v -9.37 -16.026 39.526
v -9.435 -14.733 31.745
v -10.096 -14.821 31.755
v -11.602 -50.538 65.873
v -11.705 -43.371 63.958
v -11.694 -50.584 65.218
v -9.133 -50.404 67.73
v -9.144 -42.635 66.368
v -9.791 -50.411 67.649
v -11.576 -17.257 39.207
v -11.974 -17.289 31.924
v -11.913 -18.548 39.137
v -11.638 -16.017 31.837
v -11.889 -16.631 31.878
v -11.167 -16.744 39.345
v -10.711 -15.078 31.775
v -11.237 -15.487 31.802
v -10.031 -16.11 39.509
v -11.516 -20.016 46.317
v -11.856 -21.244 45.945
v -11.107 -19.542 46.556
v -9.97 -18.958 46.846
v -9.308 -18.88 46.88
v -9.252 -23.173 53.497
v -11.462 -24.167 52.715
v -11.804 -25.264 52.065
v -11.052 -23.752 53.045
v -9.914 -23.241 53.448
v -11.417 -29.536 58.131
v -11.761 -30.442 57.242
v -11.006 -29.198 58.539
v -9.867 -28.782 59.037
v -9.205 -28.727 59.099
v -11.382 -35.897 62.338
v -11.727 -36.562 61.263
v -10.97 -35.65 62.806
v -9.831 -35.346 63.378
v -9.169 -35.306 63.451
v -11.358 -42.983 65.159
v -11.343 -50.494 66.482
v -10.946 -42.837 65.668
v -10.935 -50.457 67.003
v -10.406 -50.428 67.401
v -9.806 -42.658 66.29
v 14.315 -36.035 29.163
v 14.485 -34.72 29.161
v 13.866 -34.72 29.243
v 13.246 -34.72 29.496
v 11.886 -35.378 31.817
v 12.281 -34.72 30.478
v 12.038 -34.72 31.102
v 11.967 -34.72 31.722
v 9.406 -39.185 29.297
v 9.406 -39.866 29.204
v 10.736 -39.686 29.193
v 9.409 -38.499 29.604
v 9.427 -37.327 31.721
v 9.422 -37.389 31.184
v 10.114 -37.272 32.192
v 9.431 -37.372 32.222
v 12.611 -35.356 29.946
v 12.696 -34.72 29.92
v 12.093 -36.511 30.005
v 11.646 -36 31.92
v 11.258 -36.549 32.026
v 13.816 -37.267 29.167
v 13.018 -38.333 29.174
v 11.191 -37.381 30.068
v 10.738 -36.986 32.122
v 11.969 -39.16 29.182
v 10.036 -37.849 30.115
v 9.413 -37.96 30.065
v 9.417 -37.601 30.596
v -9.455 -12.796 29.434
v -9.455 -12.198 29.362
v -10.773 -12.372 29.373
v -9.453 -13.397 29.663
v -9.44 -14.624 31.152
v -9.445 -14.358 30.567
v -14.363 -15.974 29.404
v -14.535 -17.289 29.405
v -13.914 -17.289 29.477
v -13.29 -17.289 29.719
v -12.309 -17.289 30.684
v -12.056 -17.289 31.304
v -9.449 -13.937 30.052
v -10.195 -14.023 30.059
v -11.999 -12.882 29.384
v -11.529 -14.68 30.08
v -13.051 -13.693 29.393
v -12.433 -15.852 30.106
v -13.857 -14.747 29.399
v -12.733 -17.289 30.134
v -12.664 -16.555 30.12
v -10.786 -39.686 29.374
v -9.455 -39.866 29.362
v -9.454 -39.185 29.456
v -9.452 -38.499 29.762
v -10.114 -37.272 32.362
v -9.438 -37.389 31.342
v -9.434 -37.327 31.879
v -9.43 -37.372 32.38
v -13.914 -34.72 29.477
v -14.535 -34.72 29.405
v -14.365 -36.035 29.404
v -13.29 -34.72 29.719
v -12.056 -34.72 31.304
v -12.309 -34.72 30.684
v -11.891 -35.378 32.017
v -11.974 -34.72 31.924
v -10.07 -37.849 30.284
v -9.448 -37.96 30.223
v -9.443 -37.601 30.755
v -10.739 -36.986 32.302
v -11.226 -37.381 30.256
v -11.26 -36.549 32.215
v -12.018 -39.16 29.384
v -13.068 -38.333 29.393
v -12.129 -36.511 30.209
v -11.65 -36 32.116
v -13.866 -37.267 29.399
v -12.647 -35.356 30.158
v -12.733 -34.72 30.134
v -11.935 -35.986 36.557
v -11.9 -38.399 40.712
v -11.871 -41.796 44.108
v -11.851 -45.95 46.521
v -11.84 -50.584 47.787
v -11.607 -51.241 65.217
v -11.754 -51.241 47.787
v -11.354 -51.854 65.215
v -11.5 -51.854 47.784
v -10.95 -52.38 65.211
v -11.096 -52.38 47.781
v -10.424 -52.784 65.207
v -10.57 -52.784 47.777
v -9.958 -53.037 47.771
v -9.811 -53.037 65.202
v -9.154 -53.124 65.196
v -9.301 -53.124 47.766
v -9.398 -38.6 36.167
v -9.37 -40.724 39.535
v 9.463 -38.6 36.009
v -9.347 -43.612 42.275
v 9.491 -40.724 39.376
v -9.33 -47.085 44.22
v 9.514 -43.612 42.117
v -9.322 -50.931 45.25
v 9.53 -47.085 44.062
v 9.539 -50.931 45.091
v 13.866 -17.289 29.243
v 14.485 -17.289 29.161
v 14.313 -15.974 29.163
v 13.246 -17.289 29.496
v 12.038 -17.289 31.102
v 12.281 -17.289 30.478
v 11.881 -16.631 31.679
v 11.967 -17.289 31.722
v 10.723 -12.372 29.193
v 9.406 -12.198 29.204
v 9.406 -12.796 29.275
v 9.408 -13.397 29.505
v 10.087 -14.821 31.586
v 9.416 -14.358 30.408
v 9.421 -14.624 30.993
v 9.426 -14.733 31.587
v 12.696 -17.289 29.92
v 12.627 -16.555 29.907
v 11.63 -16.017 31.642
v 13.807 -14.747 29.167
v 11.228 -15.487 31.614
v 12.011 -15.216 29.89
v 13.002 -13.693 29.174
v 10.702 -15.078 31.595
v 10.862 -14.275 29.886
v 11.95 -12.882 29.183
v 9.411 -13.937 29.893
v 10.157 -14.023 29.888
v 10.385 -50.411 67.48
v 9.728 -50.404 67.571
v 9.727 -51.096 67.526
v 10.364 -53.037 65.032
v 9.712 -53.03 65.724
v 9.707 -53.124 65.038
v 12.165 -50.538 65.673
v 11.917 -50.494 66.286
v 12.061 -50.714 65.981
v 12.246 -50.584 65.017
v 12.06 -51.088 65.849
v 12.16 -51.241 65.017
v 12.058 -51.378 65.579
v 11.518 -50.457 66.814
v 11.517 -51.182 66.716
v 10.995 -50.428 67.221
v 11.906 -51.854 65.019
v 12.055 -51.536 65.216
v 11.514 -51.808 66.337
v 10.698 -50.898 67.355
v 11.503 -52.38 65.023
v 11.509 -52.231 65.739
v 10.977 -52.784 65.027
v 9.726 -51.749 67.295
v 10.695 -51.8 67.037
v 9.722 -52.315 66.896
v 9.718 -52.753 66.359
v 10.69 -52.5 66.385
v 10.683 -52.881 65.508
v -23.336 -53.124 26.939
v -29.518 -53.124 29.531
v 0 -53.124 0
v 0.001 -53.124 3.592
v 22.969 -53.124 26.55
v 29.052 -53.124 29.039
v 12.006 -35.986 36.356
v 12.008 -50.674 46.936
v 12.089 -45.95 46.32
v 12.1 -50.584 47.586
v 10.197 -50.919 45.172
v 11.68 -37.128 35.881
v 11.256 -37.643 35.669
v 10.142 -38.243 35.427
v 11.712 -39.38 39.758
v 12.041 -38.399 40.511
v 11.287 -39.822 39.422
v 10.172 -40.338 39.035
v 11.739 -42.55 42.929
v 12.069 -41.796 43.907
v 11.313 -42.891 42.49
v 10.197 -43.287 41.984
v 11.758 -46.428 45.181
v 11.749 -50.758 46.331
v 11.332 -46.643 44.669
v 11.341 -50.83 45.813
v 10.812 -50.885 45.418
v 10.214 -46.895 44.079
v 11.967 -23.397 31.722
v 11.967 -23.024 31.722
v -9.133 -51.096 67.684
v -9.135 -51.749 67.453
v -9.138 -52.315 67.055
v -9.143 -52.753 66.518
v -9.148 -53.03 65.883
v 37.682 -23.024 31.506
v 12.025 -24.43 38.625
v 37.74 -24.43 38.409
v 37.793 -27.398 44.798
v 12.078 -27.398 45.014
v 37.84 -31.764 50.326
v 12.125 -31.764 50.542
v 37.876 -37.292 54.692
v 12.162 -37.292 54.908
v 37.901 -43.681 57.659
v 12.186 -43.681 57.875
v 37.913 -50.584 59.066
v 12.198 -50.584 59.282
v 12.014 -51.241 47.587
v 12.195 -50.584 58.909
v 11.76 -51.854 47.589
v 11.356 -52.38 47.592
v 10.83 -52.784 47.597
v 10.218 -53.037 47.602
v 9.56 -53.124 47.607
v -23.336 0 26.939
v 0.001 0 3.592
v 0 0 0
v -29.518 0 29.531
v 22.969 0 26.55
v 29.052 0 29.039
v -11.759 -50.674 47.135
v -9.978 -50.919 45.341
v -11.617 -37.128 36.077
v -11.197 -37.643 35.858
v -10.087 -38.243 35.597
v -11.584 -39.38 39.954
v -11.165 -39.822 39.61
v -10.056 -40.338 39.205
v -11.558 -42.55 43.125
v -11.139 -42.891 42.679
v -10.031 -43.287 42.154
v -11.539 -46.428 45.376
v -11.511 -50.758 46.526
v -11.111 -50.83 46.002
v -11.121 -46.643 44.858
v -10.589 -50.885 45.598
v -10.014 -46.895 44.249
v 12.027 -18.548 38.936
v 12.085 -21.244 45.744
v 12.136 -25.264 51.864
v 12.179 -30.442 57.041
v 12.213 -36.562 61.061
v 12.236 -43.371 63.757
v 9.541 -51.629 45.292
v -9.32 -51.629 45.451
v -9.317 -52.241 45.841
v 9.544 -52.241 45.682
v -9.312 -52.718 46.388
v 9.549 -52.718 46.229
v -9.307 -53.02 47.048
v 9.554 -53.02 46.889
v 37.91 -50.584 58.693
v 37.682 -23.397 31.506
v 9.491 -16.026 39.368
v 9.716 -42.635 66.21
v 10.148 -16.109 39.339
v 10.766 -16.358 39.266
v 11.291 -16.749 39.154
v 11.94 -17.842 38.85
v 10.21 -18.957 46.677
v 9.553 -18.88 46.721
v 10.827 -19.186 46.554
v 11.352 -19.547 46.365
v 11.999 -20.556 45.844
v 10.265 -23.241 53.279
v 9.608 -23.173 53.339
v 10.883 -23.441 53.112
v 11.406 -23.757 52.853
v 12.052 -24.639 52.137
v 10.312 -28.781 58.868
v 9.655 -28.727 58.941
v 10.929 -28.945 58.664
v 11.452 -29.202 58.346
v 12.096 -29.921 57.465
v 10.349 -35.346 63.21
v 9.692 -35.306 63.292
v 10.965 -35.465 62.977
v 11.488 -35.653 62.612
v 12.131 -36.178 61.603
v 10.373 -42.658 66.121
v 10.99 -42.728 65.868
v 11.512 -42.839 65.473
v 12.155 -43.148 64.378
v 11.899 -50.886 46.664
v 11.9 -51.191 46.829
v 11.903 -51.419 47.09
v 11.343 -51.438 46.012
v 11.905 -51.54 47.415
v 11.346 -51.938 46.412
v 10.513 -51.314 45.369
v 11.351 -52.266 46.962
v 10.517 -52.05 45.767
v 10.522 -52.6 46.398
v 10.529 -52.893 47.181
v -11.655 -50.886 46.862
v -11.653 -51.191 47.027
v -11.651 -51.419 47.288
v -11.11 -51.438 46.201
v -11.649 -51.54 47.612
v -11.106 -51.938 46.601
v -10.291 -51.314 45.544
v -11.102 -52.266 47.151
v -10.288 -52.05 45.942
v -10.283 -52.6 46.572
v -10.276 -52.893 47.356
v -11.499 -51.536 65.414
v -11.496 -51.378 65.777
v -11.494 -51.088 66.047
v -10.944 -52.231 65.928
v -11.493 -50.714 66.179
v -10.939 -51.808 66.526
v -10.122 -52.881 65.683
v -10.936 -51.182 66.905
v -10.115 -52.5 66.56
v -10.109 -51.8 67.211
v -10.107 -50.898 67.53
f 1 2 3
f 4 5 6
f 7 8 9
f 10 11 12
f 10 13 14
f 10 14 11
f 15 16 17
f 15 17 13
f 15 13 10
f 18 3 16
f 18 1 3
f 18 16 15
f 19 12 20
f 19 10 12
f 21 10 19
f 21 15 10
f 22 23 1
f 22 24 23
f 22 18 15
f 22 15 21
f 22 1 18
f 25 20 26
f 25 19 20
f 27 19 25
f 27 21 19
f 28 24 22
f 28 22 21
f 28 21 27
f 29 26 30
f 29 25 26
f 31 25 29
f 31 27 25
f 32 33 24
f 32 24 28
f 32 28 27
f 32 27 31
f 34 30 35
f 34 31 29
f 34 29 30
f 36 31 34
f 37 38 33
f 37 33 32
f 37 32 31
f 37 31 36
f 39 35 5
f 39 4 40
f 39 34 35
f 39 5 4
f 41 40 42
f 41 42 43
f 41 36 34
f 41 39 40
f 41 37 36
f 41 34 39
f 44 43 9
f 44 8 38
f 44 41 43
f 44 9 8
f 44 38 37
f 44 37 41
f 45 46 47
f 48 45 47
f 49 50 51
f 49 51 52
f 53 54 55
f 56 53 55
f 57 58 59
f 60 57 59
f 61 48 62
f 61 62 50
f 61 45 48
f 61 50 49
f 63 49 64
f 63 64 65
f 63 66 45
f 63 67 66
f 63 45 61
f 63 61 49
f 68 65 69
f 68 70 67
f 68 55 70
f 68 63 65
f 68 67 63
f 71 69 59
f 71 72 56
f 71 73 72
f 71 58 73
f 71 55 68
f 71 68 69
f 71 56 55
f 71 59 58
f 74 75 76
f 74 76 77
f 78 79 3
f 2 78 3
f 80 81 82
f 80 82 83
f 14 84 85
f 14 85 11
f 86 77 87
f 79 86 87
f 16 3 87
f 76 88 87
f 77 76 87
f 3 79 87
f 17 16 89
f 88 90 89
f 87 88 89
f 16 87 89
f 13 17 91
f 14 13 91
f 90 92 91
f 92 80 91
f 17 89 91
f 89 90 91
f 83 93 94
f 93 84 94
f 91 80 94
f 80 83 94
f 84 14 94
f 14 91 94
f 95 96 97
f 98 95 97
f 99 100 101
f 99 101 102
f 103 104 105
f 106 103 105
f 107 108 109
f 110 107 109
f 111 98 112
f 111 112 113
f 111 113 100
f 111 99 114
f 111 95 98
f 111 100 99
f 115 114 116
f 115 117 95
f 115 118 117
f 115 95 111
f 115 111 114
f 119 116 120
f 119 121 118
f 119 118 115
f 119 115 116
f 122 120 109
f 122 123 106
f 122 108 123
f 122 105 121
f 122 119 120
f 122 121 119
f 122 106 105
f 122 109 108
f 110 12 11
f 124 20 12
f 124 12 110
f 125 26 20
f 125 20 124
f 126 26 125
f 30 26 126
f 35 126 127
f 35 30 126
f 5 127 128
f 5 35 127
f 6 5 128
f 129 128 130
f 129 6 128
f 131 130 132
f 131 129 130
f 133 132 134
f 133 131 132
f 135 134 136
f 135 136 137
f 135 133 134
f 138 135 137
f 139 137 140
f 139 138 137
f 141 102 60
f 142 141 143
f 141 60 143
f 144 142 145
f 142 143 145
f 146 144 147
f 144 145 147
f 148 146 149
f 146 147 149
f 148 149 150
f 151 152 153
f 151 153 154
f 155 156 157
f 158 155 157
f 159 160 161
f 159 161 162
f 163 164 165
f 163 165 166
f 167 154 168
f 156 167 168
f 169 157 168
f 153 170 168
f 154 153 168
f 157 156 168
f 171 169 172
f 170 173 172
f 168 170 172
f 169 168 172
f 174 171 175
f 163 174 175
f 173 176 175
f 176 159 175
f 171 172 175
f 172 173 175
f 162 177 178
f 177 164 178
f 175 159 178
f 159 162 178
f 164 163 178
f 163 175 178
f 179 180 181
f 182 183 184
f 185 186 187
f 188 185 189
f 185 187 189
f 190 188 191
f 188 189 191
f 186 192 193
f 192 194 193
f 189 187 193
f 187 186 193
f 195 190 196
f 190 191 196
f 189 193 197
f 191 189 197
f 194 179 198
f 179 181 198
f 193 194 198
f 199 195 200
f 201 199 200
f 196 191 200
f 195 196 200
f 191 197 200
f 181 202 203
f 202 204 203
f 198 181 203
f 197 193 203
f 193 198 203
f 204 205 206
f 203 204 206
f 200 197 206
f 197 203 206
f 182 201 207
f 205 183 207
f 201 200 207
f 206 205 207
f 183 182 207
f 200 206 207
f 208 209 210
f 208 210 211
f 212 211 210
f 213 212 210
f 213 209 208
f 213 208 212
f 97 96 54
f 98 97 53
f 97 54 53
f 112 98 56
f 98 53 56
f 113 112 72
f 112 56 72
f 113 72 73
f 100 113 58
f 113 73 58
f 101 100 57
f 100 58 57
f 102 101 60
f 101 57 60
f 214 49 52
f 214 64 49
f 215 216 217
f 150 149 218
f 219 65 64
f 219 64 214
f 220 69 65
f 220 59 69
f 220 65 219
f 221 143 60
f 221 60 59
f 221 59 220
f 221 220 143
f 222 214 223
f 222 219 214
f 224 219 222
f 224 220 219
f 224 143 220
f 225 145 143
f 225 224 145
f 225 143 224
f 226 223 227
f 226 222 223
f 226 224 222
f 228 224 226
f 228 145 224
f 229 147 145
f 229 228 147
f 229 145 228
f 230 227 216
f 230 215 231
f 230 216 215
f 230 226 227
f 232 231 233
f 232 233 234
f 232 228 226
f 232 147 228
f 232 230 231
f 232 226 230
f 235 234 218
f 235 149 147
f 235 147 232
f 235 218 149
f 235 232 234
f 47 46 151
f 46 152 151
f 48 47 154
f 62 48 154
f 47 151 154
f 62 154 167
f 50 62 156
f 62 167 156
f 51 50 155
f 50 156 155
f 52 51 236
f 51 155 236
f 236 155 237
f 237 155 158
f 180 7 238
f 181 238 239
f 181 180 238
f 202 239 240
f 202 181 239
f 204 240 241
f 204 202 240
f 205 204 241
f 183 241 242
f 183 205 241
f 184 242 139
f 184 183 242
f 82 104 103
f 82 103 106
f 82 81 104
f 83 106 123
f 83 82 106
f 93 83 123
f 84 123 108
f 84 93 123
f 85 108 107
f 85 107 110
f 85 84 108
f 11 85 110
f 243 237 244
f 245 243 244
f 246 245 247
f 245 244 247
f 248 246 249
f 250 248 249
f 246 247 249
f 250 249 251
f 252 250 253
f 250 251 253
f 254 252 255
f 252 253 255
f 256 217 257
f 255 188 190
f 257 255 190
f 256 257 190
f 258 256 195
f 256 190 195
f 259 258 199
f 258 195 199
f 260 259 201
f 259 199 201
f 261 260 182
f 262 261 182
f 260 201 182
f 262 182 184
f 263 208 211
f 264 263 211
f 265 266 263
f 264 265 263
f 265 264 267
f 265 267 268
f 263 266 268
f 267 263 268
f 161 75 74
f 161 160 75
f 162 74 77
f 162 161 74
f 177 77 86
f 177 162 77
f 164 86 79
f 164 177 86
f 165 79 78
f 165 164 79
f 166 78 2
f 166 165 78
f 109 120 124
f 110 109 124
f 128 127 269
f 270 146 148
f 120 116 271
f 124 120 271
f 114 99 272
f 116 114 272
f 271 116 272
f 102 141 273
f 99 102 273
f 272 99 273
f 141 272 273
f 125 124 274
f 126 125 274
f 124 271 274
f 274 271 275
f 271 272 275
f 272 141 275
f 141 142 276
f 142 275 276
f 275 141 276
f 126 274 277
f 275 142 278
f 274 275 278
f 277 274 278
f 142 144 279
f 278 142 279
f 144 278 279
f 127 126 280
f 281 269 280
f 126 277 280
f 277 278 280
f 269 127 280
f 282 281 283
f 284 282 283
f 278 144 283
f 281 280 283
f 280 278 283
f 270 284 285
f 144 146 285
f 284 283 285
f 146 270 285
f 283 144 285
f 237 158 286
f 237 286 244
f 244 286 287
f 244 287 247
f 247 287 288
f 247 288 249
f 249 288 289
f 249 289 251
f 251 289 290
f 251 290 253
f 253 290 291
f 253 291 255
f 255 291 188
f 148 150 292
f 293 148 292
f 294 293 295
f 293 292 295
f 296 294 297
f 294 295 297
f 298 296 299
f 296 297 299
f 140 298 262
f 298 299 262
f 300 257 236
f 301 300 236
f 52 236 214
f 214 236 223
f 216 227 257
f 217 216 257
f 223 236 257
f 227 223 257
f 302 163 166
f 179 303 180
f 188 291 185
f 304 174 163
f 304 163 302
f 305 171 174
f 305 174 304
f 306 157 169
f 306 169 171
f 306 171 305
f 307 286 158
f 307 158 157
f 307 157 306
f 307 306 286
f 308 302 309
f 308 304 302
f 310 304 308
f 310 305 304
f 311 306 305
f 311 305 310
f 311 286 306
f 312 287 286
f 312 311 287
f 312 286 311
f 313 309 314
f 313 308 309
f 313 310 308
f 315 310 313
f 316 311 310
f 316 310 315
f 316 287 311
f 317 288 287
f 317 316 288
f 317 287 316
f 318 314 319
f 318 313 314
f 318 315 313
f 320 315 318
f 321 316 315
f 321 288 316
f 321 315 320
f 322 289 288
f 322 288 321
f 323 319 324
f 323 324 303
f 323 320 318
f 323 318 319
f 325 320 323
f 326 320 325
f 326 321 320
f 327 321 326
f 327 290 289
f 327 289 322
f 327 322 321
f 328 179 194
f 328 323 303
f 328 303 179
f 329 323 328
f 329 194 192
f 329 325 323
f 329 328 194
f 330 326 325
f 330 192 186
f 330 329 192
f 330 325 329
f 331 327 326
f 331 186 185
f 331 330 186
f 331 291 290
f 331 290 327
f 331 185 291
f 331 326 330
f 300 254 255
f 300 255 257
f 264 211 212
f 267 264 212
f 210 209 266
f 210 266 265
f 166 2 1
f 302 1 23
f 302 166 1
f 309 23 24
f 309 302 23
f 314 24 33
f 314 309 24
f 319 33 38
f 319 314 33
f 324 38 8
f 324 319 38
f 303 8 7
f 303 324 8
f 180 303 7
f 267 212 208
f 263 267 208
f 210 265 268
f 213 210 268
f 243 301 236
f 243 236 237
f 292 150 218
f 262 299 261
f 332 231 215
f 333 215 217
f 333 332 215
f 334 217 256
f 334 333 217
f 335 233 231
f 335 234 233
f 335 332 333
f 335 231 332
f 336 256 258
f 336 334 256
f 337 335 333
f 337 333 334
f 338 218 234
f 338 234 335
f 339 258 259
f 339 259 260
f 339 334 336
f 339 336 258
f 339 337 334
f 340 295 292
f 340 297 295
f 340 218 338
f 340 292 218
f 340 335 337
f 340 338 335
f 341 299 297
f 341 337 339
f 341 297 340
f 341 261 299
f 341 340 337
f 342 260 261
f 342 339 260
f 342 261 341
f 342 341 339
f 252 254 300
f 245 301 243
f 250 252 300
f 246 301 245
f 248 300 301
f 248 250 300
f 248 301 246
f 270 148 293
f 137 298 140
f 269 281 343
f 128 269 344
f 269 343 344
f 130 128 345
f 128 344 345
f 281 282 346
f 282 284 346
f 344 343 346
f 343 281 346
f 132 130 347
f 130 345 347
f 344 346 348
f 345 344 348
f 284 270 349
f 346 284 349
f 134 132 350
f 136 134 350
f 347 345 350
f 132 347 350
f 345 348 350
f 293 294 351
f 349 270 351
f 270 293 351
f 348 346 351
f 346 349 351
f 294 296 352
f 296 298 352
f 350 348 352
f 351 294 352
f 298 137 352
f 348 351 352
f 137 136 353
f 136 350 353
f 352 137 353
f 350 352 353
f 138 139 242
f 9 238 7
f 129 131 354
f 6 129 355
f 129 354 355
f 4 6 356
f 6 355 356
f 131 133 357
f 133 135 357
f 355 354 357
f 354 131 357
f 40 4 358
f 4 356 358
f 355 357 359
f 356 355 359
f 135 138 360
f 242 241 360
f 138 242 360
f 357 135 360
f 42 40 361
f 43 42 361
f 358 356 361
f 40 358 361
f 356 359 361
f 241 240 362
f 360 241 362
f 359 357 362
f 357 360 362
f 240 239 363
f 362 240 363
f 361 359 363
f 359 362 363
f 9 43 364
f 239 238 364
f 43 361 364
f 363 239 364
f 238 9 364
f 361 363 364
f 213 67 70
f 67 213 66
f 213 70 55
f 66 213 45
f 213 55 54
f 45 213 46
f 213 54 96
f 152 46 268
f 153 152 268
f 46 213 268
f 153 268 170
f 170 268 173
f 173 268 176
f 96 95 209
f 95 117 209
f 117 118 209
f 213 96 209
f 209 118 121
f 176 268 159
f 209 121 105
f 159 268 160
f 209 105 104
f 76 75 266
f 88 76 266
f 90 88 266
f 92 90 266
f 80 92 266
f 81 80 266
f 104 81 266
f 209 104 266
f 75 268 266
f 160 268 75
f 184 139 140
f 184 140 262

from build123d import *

# Parameters (mm, degrees)
F1_DEPTH = 53.12398
F2_W     = 23.9413073286
F2_H     = 22.4265204743
F3_ANGLE = 90
F4_R     = 2.54
F6_DEPTH = 53.1249801
F8_DEPTH = 25.71572


with BuildPart() as f1:
    # F0 (on Front) → F1 (new body)
    with BuildSketch(Plane.XZ):
        Polygon((29.051852704, 29.0388607975), (-29.5177362859, 29.53094244), (0, 0), align=None)
    extrude(amount=F1_DEPTH)

    # F2 (on face) → F3 (revolve)
    with BuildSketch(Plane(origin=(0.2460079132, 0, 29.2808776473), x_dir=(0.9999647079, 0, -0.0084013613), z_dir=(0.0084013613, 0, 0.9999647079))):
        with Locations((-0.2708197571, -25.872068014)):
            Rectangle(F2_W, F2_H)
    revolve(axis=Axis((-0.2329417909, -53.12398, 29.2849016188), (0.9999647079, 0, -0.0084013613)), revolution_arc=F3_ANGLE)

    # F4
    f4_edges = [f1.edges().sort_by_distance(p)[0] for p in [
        (12.040709, -41.782941, 40.523222),
        (12.173937, -25.924996, 56.380607),
        (11.945429, -25.872068, 29.182583),
        (12.174382, -53.12398, 56.433533),
        (0.298358, -53.12398, 67.746968),
        (-11.76608, -53.12398, 56.634673),
        (0.109944, -53.12398, 45.321239),
        (-11.766525, -25.924996, 56.581747),
        (-0.024802, -14.658808, 29.283153),
        (-11.899753, -41.782941, 40.724362),
        (-0.024802, -37.085328, 29.283153),
        (-11.995033, -25.872068, 29.383723),
    ]]
    fillet(f4_edges, radius=F4_R)

    # F5 (on face) → F6 (cut, through all)
    with BuildSketch(Plane.XZ.offset(53.12398)):
        Polygon((0.0008033687, 3.5921023586), (22.9688507095, 26.5498784535), (-23.3355659609, 26.9389123157), align=None)
    extrude(amount=-F6_DEPTH, mode=Mode.SUBTRACT)

    # F7 (on face) → F8 (join)
    with BuildSketch(Plane(origin=(11.699420996, 0, -0.0982945313), x_dir=(0, 1, 0), z_dir=(0.9999647079, 0, -0.0084013613))):
        with BuildLine():
            Line((-23.396522254, 31.8219110662), (-23.0236383706, 31.8219110662))
            ThreePointArc((-23.0236383706, 31.8219110662), (-31.7641793665, 50.6417116997), (-50.58398, 59.3822526955))
            Line((-50.58398, 59.3822526955), (-50.58398, 59.0093688122))
            Line((-50.58398, 59.0093688122), (-23.396522254, 31.8219110662))
        make_face()
    extrude(amount=F8_DEPTH)


solid = f1.part
